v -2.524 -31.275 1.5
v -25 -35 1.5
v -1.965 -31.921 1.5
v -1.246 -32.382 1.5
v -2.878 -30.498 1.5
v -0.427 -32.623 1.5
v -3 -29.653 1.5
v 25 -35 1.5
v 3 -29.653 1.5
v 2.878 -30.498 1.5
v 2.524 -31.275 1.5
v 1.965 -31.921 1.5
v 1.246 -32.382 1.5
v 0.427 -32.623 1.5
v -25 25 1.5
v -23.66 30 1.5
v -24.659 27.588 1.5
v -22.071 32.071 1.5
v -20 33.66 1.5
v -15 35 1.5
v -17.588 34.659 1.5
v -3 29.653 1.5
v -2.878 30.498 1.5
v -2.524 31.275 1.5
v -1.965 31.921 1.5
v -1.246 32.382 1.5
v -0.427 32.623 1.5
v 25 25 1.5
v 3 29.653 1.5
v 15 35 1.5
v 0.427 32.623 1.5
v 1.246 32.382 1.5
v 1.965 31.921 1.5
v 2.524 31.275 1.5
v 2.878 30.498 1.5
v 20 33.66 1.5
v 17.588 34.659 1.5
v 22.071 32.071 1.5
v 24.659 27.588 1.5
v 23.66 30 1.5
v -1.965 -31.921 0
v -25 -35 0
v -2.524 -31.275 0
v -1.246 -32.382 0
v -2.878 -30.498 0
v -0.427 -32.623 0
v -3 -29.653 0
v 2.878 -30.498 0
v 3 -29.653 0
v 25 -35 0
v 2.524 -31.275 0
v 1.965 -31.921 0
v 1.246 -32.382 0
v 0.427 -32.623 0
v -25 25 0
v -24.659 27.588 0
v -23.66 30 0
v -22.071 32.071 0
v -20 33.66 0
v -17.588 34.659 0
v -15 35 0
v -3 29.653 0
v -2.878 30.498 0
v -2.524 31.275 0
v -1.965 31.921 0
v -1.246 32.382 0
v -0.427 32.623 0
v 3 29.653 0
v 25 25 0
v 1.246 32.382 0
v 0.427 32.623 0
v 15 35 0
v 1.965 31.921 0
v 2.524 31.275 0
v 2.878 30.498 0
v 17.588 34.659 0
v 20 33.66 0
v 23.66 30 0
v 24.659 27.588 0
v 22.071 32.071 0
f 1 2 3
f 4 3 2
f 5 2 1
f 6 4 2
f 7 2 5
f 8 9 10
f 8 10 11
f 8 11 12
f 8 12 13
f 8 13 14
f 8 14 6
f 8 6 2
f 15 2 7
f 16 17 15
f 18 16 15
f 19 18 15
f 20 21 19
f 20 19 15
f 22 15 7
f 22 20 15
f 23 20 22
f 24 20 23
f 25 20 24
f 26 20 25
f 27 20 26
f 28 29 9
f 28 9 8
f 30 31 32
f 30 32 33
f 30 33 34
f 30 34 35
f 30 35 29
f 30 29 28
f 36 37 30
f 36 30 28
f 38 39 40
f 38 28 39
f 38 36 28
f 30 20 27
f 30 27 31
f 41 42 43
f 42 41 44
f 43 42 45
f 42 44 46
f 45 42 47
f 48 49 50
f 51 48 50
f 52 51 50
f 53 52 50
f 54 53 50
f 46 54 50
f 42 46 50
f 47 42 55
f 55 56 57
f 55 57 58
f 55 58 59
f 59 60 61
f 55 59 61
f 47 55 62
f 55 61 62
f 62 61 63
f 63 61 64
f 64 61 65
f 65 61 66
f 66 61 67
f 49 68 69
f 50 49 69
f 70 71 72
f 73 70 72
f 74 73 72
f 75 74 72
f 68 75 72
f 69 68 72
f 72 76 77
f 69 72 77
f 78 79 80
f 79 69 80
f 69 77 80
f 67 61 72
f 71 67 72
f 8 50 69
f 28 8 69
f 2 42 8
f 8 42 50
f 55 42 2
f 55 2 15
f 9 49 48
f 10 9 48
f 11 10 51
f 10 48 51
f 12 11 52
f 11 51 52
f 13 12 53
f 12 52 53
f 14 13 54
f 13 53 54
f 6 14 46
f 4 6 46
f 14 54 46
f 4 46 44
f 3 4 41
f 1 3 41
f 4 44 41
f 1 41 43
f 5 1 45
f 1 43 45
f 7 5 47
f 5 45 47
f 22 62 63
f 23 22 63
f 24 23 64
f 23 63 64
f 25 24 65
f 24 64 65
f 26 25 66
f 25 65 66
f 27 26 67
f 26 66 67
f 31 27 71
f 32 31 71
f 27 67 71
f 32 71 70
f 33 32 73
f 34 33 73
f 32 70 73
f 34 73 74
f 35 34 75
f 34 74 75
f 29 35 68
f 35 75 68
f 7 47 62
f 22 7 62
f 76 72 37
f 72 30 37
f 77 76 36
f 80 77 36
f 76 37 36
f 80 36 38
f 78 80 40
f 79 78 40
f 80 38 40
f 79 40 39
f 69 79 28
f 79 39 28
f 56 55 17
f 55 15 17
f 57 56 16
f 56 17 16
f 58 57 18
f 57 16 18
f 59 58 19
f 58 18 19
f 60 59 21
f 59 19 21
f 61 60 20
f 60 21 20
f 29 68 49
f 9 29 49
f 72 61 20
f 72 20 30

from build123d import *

# Parameters (mm, degrees)
SKETCH1_W           = 50
SKETCH1_H           = 70
BOSS_EXTRUDE1_DEPTH = 1.5
FILLET1_R           = 10


with BuildPart() as part:
    # Sketch1 → Boss-Extrude1 (new body)
    with BuildSketch(Plane.XY):
        Rectangle(SKETCH1_W, SKETCH1_H)
        with BuildLine():
            Line((-3, -29.653280585), (-3, 29.653280585))
            ThreePointArc((-3, 29.653280585), (0, 32.653280585), (3, 29.653280585))
            Line((3, 29.653280585), (3, -29.653280585))
            ThreePointArc((3, -29.653280585), (0, -32.653280585), (-3, -29.653280585))
        make_face(mode=Mode.SUBTRACT)
    extrude(amount=BOSS_EXTRUDE1_DEPTH)

    # Fillet1
    fillet1_edges = [part.edges().sort_by_distance(p)[0] for p in [
        (-25, 35, 0.75),
        (25, 35, 0.75),
    ]]
    fillet(fillet1_edges, radius=FILLET1_R)


solid = part.part
